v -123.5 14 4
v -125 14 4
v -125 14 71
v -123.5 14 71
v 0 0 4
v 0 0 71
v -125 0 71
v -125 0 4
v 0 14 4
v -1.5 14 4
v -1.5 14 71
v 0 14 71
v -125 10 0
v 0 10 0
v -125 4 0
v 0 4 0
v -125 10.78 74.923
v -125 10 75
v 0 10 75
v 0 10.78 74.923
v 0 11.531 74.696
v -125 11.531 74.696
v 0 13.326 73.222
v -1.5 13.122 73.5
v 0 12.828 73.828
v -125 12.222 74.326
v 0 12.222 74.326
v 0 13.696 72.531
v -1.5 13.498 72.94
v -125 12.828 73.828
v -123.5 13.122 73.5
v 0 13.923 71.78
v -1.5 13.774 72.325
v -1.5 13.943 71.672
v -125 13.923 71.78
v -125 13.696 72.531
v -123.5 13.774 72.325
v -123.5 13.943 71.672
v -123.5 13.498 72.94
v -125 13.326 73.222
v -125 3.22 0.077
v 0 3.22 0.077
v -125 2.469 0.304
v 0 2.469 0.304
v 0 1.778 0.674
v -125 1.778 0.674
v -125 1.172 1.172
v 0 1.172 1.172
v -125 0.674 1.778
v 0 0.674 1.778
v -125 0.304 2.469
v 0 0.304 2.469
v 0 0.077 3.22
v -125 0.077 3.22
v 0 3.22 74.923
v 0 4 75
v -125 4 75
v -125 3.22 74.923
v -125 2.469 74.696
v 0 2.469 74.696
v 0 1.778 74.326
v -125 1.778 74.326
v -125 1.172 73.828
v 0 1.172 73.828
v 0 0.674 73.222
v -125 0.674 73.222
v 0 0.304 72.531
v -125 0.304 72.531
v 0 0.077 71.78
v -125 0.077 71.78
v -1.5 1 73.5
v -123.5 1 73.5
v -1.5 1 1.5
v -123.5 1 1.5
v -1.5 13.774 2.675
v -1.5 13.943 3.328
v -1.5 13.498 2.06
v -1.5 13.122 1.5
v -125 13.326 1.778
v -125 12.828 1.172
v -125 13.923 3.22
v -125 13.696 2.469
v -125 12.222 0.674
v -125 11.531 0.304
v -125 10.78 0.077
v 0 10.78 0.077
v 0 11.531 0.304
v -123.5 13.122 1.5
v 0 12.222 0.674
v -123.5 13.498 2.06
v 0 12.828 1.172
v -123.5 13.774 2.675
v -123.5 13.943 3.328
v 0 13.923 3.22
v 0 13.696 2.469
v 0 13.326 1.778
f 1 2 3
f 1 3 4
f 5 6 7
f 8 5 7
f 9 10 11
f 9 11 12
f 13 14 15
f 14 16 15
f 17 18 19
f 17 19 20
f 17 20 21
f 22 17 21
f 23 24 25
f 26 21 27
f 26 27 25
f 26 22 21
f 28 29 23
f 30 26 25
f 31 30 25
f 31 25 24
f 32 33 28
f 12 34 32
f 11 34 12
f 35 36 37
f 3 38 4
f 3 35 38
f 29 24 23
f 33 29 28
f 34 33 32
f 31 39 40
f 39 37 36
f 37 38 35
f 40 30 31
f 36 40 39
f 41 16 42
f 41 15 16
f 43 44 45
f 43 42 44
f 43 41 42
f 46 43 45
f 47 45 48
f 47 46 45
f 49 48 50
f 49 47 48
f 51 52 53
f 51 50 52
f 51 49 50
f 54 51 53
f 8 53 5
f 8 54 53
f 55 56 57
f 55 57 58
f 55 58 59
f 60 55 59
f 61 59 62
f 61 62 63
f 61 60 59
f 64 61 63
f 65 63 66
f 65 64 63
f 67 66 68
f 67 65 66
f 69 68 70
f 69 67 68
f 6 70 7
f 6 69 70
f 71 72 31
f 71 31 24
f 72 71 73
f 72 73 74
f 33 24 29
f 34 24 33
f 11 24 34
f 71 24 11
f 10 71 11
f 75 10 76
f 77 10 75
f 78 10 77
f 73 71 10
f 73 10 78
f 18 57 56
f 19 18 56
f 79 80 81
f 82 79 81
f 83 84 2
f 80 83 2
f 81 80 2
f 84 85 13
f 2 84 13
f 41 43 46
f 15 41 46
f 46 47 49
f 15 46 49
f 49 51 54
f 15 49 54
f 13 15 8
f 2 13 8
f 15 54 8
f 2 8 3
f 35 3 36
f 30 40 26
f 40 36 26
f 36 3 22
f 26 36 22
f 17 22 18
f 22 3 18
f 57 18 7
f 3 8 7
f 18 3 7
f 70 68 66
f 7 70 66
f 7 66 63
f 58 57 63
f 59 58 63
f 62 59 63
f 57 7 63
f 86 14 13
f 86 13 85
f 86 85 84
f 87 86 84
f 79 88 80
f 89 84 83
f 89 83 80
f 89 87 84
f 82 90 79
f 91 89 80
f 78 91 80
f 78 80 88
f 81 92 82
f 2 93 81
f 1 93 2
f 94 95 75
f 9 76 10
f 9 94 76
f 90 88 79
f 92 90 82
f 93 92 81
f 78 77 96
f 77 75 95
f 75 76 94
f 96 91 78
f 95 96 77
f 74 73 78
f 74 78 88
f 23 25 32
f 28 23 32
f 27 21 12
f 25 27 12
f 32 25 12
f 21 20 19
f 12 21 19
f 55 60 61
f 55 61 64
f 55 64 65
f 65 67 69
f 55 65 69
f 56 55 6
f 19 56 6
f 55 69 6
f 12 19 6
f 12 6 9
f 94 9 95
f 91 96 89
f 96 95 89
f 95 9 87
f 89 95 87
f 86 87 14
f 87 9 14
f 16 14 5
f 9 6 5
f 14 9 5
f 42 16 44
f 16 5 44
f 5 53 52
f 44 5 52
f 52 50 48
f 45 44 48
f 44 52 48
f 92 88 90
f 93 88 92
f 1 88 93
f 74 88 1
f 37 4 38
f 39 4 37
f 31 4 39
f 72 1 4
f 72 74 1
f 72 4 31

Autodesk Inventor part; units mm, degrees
ref_plane "YZ Plane" through (0, 0, 0) normal (1, 0, 0) x (0, 1, 0)
ref_plane "XZ Plane" through (0, 0, 0) normal (0, 1, 0) x (-1, 0, 0)
ref_plane "XY Plane" through (0, 0, 0) normal (0, 0, 1) x (1, 0, 0)
sketch "Sketch1" plane through (0, 0, 0) normal (0, 1, 0) x (-1, 0, 0)
  line L0 (0, 0) -> (125, 0)
  line L1 (125, 0) -> (125, 75)
  line L2 (125, 75) -> (0, 75)
  line L3 (0, 75) -> (0, 0)
  dimension "d0" = 125
  dimension "d1" = 75
extrude "Extrusion1" add sketch "Sketch1" along normal blind 1
sketch "Sketch2" plane through (0, 1, 0) normal (0, 1, 0) x (1, 0, 0)
  point P0 (0, 0)
sketch "Sketch3" plane through (0, 1, 0) normal (0, 1, 0) x (1, 0, 0)
  point P0 (0, 0)
sketch "Sketch4" plane through (0, 1, 0) normal (0, 1, 0) x (1, 0, 0)
  line L0 (-125, -75) -> (0, -75) projected
  line L1 (-125, -75) -> (0, -75)
  line L2 (0, -75) -> (0, 0)
  line L3 (0, 0) -> (-125, 0)
  line L4 (-125, 0) -> (-125, -75)
  line L5 (-123.5, -73.5) -> (-1.5, -73.5)
  line L6 (-1.5, -73.5) -> (-1.5, -1.5)
  line L7 (-1.5, -1.5) -> (-123.5, -1.5)
  line L8 (-123.5, -1.5) -> (-123.5, -73.5)
  dimension "d4" = 1.5
  dimension "d5" = 1.5
  dimension "d6" = 122
  dimension "d7" = 72
extrude "Extrusion2" add sketch "Sketch4" along normal blind 13
fillet "Fillet1" radius 4 1 edges at (-62.5, 14, 75)
fillet "Fillet2" radius 4 1 edges at (-62.5, 14, 0)
fillet "Fillet3" radius 4 1 edges at (-62.5, 0, 75)
fillet "Fillet4" radius 4 1 edges at (-62.5, 0, 0)
properties part number "Raspberry Pi Phone Test"
